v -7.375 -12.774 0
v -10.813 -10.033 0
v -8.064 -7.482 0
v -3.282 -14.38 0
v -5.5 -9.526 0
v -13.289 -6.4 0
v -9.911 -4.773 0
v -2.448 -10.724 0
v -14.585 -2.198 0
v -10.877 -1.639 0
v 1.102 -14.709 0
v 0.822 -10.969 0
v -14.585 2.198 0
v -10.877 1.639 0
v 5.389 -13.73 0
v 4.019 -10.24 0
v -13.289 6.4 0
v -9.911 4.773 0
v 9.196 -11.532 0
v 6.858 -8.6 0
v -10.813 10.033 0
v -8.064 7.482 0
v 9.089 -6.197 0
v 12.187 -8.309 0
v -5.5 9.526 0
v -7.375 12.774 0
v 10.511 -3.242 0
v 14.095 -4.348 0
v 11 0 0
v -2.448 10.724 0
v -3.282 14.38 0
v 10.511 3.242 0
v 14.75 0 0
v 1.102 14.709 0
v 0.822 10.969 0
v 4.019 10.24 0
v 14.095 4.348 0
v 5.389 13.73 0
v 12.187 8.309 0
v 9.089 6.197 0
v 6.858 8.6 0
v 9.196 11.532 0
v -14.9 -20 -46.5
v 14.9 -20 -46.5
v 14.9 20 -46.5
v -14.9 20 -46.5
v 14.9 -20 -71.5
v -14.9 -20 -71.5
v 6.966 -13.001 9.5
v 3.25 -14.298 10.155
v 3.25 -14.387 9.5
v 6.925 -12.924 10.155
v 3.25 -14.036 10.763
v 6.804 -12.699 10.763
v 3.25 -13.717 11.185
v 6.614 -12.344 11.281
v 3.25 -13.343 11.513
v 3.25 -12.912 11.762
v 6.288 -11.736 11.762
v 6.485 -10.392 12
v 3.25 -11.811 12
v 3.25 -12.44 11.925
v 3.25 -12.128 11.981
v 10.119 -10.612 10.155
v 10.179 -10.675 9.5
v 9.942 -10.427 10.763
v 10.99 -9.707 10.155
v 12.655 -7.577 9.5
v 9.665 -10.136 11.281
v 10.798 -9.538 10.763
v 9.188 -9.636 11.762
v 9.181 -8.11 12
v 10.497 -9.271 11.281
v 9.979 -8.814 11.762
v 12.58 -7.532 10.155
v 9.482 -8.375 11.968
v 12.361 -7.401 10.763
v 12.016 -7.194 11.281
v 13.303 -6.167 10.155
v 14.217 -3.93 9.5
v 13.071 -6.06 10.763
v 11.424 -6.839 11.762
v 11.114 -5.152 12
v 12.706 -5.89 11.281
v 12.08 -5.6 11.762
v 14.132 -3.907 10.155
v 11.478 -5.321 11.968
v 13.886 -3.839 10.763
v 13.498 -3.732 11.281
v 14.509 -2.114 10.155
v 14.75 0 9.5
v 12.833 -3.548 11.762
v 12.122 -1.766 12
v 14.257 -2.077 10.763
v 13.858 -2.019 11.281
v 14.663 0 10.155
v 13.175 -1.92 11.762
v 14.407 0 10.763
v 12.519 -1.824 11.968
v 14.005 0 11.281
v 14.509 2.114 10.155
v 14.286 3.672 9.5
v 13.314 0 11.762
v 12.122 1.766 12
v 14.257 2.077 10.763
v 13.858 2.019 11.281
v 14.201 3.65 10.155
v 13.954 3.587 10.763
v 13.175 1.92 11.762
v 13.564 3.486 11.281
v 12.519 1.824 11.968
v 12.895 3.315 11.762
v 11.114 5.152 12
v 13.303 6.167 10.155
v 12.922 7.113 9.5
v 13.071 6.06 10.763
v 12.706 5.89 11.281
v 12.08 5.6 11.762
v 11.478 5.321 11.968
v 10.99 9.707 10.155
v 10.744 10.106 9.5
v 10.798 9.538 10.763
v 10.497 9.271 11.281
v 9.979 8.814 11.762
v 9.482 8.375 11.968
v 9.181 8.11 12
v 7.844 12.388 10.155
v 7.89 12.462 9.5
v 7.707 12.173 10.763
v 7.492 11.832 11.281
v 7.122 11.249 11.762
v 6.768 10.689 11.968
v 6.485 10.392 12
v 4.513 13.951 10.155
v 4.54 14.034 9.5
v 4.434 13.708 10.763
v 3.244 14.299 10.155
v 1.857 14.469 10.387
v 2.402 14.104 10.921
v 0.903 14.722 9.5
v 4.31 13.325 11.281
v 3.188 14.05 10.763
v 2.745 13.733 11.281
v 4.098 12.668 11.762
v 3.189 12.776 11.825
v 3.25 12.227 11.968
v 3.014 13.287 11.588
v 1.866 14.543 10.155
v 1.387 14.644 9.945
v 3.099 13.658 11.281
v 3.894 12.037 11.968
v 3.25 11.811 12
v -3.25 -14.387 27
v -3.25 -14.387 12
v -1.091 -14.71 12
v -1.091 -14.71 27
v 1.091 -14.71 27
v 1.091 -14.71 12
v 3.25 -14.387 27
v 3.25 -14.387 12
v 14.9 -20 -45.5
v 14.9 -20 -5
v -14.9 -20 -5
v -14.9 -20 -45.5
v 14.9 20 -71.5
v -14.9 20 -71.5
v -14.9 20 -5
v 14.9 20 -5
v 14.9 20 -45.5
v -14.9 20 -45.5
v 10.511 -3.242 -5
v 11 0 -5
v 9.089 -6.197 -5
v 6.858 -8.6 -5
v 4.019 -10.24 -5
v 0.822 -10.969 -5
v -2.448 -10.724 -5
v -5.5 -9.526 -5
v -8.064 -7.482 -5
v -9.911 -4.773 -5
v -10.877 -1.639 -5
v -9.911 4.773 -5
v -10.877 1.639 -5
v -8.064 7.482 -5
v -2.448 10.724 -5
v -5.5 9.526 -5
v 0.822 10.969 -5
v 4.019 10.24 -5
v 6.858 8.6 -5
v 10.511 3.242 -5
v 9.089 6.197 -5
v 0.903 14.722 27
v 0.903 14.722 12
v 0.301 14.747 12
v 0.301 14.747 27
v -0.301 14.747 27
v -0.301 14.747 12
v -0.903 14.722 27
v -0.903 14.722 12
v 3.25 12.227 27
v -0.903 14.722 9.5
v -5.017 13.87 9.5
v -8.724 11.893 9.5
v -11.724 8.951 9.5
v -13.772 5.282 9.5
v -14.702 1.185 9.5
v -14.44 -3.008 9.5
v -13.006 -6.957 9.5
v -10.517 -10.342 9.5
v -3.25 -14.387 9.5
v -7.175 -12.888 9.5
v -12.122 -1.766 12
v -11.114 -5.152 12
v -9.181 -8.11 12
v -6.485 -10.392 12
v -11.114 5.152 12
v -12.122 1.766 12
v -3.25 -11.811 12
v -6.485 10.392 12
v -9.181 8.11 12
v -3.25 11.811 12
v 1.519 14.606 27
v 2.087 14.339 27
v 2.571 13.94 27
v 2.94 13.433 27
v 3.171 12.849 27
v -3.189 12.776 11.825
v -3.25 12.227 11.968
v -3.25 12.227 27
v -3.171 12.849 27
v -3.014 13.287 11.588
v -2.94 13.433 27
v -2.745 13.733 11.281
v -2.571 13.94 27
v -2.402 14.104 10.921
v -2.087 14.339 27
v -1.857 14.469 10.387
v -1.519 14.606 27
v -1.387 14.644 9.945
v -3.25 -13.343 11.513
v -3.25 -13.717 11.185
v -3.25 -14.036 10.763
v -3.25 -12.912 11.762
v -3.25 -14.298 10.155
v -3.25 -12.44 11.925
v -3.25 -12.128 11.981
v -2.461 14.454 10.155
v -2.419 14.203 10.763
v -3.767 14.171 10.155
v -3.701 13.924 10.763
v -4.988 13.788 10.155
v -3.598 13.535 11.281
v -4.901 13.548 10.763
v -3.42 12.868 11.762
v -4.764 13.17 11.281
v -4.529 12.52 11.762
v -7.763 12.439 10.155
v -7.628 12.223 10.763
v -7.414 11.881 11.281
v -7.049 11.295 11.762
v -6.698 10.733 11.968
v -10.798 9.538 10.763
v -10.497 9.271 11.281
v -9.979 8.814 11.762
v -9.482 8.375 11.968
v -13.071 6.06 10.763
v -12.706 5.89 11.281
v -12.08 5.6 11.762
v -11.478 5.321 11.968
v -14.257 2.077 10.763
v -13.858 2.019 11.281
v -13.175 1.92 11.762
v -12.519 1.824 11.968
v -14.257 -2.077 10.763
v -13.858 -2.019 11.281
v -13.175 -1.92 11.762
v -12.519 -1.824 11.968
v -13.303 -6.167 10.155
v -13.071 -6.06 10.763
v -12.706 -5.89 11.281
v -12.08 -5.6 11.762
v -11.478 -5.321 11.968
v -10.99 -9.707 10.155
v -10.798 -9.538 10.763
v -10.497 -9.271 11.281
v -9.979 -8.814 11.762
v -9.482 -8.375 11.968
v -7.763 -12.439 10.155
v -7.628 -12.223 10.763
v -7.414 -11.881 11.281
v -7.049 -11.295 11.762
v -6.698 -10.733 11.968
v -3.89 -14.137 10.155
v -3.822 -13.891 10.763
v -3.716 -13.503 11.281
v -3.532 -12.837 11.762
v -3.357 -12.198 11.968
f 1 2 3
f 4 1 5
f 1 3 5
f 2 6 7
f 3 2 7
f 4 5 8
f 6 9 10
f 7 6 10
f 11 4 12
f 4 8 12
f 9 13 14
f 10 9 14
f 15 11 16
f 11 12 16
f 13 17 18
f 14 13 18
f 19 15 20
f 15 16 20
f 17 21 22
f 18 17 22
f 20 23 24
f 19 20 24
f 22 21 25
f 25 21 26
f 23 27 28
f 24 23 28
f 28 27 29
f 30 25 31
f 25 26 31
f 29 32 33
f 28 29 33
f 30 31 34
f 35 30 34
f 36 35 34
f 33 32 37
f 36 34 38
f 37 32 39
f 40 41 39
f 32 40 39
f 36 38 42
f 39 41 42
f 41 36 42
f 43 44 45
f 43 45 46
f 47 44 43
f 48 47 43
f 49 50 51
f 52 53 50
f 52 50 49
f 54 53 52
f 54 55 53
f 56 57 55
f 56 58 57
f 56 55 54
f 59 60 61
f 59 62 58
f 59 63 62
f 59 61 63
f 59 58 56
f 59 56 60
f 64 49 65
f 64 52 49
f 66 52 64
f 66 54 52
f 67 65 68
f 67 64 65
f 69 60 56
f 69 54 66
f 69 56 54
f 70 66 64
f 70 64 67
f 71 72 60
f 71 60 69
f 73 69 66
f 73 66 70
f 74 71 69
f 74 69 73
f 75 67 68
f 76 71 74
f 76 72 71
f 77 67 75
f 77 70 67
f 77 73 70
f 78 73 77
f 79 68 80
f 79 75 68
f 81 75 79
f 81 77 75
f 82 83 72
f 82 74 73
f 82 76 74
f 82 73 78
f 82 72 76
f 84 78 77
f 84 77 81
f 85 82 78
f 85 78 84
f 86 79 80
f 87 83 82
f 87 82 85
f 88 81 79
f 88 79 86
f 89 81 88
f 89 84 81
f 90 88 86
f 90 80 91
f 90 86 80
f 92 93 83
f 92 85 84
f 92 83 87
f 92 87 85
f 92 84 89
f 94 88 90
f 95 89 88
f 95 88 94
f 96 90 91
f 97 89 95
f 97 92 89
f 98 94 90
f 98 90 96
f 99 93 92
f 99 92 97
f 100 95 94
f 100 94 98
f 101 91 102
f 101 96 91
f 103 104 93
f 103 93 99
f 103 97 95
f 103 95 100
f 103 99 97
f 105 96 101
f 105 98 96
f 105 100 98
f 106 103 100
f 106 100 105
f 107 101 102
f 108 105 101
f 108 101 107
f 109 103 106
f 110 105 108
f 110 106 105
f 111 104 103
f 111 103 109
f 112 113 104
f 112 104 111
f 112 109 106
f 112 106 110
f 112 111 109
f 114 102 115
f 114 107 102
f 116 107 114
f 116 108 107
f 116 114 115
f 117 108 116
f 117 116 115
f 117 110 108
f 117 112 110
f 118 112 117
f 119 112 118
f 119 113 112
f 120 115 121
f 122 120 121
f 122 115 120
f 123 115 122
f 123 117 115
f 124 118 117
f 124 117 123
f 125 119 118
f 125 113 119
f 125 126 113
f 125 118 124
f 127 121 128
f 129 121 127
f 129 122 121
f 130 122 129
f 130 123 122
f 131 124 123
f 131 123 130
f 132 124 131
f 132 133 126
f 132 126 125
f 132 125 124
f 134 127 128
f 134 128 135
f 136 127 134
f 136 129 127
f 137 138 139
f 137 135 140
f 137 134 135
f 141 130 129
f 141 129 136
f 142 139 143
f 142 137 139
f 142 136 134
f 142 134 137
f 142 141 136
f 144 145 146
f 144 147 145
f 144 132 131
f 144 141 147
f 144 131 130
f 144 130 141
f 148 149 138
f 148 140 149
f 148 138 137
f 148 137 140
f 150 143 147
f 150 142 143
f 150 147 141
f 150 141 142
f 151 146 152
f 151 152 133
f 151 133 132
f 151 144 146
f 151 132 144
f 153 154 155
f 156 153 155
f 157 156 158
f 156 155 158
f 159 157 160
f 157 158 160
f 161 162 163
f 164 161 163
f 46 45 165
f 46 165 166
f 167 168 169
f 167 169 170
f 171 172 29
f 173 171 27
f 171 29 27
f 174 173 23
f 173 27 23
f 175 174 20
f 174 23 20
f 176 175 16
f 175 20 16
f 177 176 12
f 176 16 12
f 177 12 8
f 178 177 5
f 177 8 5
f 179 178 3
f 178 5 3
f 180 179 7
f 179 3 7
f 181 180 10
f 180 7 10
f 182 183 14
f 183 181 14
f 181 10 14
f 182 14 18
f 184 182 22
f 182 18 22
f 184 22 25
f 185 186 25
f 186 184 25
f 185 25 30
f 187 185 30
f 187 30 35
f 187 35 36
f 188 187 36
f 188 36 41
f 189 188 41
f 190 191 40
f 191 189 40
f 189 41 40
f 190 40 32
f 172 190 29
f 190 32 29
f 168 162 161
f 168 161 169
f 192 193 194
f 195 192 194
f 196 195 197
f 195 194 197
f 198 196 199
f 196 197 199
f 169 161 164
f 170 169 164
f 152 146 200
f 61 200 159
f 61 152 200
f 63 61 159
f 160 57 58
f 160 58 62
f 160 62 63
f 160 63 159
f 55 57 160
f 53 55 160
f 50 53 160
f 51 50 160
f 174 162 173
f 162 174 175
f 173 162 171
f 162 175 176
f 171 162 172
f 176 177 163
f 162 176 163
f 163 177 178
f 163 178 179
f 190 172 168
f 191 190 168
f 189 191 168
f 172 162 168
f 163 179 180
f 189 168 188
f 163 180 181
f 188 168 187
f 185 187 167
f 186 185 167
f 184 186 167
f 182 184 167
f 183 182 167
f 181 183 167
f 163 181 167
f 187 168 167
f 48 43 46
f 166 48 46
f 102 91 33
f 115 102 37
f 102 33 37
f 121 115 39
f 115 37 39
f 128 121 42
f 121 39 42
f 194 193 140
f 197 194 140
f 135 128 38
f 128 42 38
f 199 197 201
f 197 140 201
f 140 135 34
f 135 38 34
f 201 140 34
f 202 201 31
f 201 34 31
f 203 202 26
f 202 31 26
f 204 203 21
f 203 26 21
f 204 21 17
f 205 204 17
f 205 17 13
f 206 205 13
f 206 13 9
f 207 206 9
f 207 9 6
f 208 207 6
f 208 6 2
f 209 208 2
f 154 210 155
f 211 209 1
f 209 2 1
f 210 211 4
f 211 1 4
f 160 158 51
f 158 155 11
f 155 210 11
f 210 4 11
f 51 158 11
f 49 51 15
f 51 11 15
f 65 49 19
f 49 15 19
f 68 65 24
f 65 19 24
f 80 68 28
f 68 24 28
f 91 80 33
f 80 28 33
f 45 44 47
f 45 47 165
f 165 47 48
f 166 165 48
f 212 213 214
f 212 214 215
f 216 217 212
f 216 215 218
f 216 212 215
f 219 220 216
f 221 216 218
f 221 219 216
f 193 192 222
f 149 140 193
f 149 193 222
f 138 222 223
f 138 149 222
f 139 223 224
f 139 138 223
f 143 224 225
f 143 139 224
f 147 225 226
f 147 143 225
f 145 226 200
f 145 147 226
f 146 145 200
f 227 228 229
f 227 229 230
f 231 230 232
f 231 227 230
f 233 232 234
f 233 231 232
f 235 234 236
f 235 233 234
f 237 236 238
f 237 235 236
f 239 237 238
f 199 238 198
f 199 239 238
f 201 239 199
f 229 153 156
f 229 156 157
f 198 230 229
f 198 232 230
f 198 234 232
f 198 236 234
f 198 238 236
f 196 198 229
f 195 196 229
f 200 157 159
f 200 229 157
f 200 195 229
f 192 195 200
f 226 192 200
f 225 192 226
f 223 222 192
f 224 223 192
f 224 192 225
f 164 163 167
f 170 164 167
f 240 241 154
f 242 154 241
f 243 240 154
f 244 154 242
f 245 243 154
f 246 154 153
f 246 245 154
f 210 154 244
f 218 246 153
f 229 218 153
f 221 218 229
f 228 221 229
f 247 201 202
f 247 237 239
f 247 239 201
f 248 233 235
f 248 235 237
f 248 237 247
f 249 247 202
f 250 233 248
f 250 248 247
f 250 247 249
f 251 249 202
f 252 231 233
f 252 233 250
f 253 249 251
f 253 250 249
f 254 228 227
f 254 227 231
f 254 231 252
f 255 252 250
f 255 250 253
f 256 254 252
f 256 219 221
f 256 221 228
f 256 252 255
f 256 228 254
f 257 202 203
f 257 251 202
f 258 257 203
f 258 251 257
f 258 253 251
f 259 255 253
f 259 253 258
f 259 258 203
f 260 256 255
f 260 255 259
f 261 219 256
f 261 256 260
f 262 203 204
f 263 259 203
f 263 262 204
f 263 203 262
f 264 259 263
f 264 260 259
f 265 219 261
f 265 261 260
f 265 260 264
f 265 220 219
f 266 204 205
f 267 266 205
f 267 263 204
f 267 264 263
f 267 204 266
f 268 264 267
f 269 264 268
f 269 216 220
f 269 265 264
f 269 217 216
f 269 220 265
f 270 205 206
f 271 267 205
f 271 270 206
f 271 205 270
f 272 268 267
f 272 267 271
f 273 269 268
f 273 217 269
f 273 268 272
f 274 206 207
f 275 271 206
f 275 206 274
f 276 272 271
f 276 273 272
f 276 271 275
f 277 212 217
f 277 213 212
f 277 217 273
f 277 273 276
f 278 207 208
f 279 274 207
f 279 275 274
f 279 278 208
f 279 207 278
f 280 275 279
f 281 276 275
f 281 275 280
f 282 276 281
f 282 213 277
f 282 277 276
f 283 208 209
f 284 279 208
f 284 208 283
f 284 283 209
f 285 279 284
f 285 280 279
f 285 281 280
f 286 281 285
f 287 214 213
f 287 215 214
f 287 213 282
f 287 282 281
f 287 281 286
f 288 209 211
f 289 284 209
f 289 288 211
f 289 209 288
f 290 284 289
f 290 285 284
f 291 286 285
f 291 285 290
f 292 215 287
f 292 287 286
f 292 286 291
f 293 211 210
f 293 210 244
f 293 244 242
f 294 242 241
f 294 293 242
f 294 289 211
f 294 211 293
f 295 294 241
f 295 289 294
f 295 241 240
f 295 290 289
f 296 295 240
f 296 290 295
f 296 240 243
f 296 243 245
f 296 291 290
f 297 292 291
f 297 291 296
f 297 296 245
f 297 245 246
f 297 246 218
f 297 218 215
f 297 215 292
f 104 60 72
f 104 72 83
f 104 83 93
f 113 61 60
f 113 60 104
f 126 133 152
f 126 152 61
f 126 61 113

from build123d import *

# Parameters (mm, degrees)
SKETCH1_R           = 14.75
BOSS_EXTRUDE1_DEPTH = 12
BOSS_EXTRUDE2_DEPTH = 15
FILLET1_START       = 12
FILLET1_DEPTH       = 16
FILLET1_START_2     = 9.4999999
FILLET1_2_DEPTH     = 2.5000001
SKETCH3_R           = 11
BOSS_EXTRUDE3_DEPTH = 15
BOSS_EXTRUDE4_START = 5
SKETCH4_W           = 29.8
SKETCH4_H           = 40
BOSS_EXTRUDE4_DEPTH = 40.5
BOSS_EXTRUDE6_START = 1
SKETCH6_W           = 29.8
SKETCH6_H           = 40
BOSS_EXTRUDE6_DEPTH = 25


with BuildPart() as part:
    # Sketch1 → Boss-Extrude1 (new body)
    with BuildSketch(Plane.XY):
        Circle(SKETCH1_R)
    extrude(amount=BOSS_EXTRUDE1_DEPTH)

    # Sketch2 → Boss-Extrude2 (add)
    with BuildSketch(Plane.XY.offset(12)):
        with BuildLine():
            Line((-3.25, 14.38749457), (-3.25, -14.38749457))
            ThreePointArc((-3.25, -14.38749457), (0, -14.75), (3.25, -14.38749457))
            Line((3.25, -14.38749457), (3.25, 14.38749457))
            ThreePointArc((3.25, 14.38749457), (0, 14.75), (-3.25, 14.38749457))
        make_face()
    extrude(amount=BOSS_EXTRUDE2_DEPTH)

    # Fillet1: read off the stored shape, not the designer's step
    # Fillet1 outline → Fillet1 (cut)
    with BuildSketch(Plane.XY.offset(FILLET1_START)):
        with BuildLine():
            Line((-3.25, 14.38749457), (-3.25, 12.227019261))
            ThreePointArc((-3.25, 12.227019261), (-2.571078397, 13.939816234), (-0.903061224, 14.722329314))
            ThreePointArc((-0.903061224, 14.722329314), (-2.083268576, 14.602139982), (-3.25, 14.38749457))
        make_face()
        with BuildLine():
            ThreePointArc((3.25, 14.38749457), (2.083268576, 14.602139982), (0.903061224, 14.722329314))
            ThreePointArc((0.903061224, 14.722329314), (2.571078397, 13.939816234), (3.25, 12.227019261))
            Line((3.25, 12.227019261), (3.25, 14.38749457))
        make_face()
    extrude(amount=FILLET1_DEPTH, mode=Mode.SUBTRACT)

    # Fillet1 2 outline → Fillet1 2 (cut)
    with BuildSketch(Plane.XY.offset(FILLET1_START_2)):
        with BuildLine():
            Line((-3.25, -14.38749457), (-3.25, 12.227019261))
            ThreePointArc((-3.25, 12.227019261), (-2.571078397, 13.939816234), (-0.903061224, 14.722329314))
            ThreePointArc((-0.903061224, 14.722329314), (-14.702293733, 1.185351838), (-3.25, -14.38749457))
        make_face()
        with BuildLine():
            ThreePointArc((3.25, -14.38749457), (14.702293733, 1.185351838), (0.903061224, 14.722329314))
            ThreePointArc((0.903061224, 14.722329314), (2.571078397, 13.939816234), (3.25, 12.227019261))
            Line((3.25, 12.227019261), (3.25, -14.38749457))
        make_face()
    extrude(amount=FILLET1_2_DEPTH, mode=Mode.SUBTRACT)

    # Fillet1 3 outline → Fillet1 3 (revolve)
    with BuildSketch(Plane.XZ):
        with BuildLine():
            Line((12.25, 12), (0, 12))
            Line((0, 12), (0, 9.4999999))
            Line((0, 9.4999999), (14.75, 9.5))
            ThreePointArc((14.75, 9.5), (14.017766953, 11.267766953), (12.25, 12))
        make_face()
    revolve(axis=Axis((0, 0, 0), (0, 0, 1)))

    # Sketch3 → Boss-Extrude3 (add)
    with BuildSketch(Plane(origin=(0, 0, 0), x_dir=(-1, 0, 0), z_dir=(0, 0, -1))):
        with Locations(Location((0, 0, 0), (0, 0, 180))):
            Circle(SKETCH3_R)
    extrude(amount=BOSS_EXTRUDE3_DEPTH)

    # Sketch4 → Boss-Extrude4 (add)
    with BuildSketch(Plane(origin=(0, 0, 0), x_dir=(-1, 0, 0), z_dir=(0, 0, -1)).offset(BOSS_EXTRUDE4_START)):
        Rectangle(SKETCH4_W, SKETCH4_H)
    extrude(amount=BOSS_EXTRUDE4_DEPTH)


with BuildPart() as body_2:
    # Sketch6 → Boss-Extrude6 (new body)
    with BuildSketch(Plane(origin=(0, 0, -45.5), x_dir=(-1, 0, 0), z_dir=(0, 0, -1)).offset(BOSS_EXTRUDE6_START)):
        Rectangle(SKETCH6_W, SKETCH6_H)
    extrude(amount=BOSS_EXTRUDE6_DEPTH)


solid = Compound([part.part, body_2.part])
